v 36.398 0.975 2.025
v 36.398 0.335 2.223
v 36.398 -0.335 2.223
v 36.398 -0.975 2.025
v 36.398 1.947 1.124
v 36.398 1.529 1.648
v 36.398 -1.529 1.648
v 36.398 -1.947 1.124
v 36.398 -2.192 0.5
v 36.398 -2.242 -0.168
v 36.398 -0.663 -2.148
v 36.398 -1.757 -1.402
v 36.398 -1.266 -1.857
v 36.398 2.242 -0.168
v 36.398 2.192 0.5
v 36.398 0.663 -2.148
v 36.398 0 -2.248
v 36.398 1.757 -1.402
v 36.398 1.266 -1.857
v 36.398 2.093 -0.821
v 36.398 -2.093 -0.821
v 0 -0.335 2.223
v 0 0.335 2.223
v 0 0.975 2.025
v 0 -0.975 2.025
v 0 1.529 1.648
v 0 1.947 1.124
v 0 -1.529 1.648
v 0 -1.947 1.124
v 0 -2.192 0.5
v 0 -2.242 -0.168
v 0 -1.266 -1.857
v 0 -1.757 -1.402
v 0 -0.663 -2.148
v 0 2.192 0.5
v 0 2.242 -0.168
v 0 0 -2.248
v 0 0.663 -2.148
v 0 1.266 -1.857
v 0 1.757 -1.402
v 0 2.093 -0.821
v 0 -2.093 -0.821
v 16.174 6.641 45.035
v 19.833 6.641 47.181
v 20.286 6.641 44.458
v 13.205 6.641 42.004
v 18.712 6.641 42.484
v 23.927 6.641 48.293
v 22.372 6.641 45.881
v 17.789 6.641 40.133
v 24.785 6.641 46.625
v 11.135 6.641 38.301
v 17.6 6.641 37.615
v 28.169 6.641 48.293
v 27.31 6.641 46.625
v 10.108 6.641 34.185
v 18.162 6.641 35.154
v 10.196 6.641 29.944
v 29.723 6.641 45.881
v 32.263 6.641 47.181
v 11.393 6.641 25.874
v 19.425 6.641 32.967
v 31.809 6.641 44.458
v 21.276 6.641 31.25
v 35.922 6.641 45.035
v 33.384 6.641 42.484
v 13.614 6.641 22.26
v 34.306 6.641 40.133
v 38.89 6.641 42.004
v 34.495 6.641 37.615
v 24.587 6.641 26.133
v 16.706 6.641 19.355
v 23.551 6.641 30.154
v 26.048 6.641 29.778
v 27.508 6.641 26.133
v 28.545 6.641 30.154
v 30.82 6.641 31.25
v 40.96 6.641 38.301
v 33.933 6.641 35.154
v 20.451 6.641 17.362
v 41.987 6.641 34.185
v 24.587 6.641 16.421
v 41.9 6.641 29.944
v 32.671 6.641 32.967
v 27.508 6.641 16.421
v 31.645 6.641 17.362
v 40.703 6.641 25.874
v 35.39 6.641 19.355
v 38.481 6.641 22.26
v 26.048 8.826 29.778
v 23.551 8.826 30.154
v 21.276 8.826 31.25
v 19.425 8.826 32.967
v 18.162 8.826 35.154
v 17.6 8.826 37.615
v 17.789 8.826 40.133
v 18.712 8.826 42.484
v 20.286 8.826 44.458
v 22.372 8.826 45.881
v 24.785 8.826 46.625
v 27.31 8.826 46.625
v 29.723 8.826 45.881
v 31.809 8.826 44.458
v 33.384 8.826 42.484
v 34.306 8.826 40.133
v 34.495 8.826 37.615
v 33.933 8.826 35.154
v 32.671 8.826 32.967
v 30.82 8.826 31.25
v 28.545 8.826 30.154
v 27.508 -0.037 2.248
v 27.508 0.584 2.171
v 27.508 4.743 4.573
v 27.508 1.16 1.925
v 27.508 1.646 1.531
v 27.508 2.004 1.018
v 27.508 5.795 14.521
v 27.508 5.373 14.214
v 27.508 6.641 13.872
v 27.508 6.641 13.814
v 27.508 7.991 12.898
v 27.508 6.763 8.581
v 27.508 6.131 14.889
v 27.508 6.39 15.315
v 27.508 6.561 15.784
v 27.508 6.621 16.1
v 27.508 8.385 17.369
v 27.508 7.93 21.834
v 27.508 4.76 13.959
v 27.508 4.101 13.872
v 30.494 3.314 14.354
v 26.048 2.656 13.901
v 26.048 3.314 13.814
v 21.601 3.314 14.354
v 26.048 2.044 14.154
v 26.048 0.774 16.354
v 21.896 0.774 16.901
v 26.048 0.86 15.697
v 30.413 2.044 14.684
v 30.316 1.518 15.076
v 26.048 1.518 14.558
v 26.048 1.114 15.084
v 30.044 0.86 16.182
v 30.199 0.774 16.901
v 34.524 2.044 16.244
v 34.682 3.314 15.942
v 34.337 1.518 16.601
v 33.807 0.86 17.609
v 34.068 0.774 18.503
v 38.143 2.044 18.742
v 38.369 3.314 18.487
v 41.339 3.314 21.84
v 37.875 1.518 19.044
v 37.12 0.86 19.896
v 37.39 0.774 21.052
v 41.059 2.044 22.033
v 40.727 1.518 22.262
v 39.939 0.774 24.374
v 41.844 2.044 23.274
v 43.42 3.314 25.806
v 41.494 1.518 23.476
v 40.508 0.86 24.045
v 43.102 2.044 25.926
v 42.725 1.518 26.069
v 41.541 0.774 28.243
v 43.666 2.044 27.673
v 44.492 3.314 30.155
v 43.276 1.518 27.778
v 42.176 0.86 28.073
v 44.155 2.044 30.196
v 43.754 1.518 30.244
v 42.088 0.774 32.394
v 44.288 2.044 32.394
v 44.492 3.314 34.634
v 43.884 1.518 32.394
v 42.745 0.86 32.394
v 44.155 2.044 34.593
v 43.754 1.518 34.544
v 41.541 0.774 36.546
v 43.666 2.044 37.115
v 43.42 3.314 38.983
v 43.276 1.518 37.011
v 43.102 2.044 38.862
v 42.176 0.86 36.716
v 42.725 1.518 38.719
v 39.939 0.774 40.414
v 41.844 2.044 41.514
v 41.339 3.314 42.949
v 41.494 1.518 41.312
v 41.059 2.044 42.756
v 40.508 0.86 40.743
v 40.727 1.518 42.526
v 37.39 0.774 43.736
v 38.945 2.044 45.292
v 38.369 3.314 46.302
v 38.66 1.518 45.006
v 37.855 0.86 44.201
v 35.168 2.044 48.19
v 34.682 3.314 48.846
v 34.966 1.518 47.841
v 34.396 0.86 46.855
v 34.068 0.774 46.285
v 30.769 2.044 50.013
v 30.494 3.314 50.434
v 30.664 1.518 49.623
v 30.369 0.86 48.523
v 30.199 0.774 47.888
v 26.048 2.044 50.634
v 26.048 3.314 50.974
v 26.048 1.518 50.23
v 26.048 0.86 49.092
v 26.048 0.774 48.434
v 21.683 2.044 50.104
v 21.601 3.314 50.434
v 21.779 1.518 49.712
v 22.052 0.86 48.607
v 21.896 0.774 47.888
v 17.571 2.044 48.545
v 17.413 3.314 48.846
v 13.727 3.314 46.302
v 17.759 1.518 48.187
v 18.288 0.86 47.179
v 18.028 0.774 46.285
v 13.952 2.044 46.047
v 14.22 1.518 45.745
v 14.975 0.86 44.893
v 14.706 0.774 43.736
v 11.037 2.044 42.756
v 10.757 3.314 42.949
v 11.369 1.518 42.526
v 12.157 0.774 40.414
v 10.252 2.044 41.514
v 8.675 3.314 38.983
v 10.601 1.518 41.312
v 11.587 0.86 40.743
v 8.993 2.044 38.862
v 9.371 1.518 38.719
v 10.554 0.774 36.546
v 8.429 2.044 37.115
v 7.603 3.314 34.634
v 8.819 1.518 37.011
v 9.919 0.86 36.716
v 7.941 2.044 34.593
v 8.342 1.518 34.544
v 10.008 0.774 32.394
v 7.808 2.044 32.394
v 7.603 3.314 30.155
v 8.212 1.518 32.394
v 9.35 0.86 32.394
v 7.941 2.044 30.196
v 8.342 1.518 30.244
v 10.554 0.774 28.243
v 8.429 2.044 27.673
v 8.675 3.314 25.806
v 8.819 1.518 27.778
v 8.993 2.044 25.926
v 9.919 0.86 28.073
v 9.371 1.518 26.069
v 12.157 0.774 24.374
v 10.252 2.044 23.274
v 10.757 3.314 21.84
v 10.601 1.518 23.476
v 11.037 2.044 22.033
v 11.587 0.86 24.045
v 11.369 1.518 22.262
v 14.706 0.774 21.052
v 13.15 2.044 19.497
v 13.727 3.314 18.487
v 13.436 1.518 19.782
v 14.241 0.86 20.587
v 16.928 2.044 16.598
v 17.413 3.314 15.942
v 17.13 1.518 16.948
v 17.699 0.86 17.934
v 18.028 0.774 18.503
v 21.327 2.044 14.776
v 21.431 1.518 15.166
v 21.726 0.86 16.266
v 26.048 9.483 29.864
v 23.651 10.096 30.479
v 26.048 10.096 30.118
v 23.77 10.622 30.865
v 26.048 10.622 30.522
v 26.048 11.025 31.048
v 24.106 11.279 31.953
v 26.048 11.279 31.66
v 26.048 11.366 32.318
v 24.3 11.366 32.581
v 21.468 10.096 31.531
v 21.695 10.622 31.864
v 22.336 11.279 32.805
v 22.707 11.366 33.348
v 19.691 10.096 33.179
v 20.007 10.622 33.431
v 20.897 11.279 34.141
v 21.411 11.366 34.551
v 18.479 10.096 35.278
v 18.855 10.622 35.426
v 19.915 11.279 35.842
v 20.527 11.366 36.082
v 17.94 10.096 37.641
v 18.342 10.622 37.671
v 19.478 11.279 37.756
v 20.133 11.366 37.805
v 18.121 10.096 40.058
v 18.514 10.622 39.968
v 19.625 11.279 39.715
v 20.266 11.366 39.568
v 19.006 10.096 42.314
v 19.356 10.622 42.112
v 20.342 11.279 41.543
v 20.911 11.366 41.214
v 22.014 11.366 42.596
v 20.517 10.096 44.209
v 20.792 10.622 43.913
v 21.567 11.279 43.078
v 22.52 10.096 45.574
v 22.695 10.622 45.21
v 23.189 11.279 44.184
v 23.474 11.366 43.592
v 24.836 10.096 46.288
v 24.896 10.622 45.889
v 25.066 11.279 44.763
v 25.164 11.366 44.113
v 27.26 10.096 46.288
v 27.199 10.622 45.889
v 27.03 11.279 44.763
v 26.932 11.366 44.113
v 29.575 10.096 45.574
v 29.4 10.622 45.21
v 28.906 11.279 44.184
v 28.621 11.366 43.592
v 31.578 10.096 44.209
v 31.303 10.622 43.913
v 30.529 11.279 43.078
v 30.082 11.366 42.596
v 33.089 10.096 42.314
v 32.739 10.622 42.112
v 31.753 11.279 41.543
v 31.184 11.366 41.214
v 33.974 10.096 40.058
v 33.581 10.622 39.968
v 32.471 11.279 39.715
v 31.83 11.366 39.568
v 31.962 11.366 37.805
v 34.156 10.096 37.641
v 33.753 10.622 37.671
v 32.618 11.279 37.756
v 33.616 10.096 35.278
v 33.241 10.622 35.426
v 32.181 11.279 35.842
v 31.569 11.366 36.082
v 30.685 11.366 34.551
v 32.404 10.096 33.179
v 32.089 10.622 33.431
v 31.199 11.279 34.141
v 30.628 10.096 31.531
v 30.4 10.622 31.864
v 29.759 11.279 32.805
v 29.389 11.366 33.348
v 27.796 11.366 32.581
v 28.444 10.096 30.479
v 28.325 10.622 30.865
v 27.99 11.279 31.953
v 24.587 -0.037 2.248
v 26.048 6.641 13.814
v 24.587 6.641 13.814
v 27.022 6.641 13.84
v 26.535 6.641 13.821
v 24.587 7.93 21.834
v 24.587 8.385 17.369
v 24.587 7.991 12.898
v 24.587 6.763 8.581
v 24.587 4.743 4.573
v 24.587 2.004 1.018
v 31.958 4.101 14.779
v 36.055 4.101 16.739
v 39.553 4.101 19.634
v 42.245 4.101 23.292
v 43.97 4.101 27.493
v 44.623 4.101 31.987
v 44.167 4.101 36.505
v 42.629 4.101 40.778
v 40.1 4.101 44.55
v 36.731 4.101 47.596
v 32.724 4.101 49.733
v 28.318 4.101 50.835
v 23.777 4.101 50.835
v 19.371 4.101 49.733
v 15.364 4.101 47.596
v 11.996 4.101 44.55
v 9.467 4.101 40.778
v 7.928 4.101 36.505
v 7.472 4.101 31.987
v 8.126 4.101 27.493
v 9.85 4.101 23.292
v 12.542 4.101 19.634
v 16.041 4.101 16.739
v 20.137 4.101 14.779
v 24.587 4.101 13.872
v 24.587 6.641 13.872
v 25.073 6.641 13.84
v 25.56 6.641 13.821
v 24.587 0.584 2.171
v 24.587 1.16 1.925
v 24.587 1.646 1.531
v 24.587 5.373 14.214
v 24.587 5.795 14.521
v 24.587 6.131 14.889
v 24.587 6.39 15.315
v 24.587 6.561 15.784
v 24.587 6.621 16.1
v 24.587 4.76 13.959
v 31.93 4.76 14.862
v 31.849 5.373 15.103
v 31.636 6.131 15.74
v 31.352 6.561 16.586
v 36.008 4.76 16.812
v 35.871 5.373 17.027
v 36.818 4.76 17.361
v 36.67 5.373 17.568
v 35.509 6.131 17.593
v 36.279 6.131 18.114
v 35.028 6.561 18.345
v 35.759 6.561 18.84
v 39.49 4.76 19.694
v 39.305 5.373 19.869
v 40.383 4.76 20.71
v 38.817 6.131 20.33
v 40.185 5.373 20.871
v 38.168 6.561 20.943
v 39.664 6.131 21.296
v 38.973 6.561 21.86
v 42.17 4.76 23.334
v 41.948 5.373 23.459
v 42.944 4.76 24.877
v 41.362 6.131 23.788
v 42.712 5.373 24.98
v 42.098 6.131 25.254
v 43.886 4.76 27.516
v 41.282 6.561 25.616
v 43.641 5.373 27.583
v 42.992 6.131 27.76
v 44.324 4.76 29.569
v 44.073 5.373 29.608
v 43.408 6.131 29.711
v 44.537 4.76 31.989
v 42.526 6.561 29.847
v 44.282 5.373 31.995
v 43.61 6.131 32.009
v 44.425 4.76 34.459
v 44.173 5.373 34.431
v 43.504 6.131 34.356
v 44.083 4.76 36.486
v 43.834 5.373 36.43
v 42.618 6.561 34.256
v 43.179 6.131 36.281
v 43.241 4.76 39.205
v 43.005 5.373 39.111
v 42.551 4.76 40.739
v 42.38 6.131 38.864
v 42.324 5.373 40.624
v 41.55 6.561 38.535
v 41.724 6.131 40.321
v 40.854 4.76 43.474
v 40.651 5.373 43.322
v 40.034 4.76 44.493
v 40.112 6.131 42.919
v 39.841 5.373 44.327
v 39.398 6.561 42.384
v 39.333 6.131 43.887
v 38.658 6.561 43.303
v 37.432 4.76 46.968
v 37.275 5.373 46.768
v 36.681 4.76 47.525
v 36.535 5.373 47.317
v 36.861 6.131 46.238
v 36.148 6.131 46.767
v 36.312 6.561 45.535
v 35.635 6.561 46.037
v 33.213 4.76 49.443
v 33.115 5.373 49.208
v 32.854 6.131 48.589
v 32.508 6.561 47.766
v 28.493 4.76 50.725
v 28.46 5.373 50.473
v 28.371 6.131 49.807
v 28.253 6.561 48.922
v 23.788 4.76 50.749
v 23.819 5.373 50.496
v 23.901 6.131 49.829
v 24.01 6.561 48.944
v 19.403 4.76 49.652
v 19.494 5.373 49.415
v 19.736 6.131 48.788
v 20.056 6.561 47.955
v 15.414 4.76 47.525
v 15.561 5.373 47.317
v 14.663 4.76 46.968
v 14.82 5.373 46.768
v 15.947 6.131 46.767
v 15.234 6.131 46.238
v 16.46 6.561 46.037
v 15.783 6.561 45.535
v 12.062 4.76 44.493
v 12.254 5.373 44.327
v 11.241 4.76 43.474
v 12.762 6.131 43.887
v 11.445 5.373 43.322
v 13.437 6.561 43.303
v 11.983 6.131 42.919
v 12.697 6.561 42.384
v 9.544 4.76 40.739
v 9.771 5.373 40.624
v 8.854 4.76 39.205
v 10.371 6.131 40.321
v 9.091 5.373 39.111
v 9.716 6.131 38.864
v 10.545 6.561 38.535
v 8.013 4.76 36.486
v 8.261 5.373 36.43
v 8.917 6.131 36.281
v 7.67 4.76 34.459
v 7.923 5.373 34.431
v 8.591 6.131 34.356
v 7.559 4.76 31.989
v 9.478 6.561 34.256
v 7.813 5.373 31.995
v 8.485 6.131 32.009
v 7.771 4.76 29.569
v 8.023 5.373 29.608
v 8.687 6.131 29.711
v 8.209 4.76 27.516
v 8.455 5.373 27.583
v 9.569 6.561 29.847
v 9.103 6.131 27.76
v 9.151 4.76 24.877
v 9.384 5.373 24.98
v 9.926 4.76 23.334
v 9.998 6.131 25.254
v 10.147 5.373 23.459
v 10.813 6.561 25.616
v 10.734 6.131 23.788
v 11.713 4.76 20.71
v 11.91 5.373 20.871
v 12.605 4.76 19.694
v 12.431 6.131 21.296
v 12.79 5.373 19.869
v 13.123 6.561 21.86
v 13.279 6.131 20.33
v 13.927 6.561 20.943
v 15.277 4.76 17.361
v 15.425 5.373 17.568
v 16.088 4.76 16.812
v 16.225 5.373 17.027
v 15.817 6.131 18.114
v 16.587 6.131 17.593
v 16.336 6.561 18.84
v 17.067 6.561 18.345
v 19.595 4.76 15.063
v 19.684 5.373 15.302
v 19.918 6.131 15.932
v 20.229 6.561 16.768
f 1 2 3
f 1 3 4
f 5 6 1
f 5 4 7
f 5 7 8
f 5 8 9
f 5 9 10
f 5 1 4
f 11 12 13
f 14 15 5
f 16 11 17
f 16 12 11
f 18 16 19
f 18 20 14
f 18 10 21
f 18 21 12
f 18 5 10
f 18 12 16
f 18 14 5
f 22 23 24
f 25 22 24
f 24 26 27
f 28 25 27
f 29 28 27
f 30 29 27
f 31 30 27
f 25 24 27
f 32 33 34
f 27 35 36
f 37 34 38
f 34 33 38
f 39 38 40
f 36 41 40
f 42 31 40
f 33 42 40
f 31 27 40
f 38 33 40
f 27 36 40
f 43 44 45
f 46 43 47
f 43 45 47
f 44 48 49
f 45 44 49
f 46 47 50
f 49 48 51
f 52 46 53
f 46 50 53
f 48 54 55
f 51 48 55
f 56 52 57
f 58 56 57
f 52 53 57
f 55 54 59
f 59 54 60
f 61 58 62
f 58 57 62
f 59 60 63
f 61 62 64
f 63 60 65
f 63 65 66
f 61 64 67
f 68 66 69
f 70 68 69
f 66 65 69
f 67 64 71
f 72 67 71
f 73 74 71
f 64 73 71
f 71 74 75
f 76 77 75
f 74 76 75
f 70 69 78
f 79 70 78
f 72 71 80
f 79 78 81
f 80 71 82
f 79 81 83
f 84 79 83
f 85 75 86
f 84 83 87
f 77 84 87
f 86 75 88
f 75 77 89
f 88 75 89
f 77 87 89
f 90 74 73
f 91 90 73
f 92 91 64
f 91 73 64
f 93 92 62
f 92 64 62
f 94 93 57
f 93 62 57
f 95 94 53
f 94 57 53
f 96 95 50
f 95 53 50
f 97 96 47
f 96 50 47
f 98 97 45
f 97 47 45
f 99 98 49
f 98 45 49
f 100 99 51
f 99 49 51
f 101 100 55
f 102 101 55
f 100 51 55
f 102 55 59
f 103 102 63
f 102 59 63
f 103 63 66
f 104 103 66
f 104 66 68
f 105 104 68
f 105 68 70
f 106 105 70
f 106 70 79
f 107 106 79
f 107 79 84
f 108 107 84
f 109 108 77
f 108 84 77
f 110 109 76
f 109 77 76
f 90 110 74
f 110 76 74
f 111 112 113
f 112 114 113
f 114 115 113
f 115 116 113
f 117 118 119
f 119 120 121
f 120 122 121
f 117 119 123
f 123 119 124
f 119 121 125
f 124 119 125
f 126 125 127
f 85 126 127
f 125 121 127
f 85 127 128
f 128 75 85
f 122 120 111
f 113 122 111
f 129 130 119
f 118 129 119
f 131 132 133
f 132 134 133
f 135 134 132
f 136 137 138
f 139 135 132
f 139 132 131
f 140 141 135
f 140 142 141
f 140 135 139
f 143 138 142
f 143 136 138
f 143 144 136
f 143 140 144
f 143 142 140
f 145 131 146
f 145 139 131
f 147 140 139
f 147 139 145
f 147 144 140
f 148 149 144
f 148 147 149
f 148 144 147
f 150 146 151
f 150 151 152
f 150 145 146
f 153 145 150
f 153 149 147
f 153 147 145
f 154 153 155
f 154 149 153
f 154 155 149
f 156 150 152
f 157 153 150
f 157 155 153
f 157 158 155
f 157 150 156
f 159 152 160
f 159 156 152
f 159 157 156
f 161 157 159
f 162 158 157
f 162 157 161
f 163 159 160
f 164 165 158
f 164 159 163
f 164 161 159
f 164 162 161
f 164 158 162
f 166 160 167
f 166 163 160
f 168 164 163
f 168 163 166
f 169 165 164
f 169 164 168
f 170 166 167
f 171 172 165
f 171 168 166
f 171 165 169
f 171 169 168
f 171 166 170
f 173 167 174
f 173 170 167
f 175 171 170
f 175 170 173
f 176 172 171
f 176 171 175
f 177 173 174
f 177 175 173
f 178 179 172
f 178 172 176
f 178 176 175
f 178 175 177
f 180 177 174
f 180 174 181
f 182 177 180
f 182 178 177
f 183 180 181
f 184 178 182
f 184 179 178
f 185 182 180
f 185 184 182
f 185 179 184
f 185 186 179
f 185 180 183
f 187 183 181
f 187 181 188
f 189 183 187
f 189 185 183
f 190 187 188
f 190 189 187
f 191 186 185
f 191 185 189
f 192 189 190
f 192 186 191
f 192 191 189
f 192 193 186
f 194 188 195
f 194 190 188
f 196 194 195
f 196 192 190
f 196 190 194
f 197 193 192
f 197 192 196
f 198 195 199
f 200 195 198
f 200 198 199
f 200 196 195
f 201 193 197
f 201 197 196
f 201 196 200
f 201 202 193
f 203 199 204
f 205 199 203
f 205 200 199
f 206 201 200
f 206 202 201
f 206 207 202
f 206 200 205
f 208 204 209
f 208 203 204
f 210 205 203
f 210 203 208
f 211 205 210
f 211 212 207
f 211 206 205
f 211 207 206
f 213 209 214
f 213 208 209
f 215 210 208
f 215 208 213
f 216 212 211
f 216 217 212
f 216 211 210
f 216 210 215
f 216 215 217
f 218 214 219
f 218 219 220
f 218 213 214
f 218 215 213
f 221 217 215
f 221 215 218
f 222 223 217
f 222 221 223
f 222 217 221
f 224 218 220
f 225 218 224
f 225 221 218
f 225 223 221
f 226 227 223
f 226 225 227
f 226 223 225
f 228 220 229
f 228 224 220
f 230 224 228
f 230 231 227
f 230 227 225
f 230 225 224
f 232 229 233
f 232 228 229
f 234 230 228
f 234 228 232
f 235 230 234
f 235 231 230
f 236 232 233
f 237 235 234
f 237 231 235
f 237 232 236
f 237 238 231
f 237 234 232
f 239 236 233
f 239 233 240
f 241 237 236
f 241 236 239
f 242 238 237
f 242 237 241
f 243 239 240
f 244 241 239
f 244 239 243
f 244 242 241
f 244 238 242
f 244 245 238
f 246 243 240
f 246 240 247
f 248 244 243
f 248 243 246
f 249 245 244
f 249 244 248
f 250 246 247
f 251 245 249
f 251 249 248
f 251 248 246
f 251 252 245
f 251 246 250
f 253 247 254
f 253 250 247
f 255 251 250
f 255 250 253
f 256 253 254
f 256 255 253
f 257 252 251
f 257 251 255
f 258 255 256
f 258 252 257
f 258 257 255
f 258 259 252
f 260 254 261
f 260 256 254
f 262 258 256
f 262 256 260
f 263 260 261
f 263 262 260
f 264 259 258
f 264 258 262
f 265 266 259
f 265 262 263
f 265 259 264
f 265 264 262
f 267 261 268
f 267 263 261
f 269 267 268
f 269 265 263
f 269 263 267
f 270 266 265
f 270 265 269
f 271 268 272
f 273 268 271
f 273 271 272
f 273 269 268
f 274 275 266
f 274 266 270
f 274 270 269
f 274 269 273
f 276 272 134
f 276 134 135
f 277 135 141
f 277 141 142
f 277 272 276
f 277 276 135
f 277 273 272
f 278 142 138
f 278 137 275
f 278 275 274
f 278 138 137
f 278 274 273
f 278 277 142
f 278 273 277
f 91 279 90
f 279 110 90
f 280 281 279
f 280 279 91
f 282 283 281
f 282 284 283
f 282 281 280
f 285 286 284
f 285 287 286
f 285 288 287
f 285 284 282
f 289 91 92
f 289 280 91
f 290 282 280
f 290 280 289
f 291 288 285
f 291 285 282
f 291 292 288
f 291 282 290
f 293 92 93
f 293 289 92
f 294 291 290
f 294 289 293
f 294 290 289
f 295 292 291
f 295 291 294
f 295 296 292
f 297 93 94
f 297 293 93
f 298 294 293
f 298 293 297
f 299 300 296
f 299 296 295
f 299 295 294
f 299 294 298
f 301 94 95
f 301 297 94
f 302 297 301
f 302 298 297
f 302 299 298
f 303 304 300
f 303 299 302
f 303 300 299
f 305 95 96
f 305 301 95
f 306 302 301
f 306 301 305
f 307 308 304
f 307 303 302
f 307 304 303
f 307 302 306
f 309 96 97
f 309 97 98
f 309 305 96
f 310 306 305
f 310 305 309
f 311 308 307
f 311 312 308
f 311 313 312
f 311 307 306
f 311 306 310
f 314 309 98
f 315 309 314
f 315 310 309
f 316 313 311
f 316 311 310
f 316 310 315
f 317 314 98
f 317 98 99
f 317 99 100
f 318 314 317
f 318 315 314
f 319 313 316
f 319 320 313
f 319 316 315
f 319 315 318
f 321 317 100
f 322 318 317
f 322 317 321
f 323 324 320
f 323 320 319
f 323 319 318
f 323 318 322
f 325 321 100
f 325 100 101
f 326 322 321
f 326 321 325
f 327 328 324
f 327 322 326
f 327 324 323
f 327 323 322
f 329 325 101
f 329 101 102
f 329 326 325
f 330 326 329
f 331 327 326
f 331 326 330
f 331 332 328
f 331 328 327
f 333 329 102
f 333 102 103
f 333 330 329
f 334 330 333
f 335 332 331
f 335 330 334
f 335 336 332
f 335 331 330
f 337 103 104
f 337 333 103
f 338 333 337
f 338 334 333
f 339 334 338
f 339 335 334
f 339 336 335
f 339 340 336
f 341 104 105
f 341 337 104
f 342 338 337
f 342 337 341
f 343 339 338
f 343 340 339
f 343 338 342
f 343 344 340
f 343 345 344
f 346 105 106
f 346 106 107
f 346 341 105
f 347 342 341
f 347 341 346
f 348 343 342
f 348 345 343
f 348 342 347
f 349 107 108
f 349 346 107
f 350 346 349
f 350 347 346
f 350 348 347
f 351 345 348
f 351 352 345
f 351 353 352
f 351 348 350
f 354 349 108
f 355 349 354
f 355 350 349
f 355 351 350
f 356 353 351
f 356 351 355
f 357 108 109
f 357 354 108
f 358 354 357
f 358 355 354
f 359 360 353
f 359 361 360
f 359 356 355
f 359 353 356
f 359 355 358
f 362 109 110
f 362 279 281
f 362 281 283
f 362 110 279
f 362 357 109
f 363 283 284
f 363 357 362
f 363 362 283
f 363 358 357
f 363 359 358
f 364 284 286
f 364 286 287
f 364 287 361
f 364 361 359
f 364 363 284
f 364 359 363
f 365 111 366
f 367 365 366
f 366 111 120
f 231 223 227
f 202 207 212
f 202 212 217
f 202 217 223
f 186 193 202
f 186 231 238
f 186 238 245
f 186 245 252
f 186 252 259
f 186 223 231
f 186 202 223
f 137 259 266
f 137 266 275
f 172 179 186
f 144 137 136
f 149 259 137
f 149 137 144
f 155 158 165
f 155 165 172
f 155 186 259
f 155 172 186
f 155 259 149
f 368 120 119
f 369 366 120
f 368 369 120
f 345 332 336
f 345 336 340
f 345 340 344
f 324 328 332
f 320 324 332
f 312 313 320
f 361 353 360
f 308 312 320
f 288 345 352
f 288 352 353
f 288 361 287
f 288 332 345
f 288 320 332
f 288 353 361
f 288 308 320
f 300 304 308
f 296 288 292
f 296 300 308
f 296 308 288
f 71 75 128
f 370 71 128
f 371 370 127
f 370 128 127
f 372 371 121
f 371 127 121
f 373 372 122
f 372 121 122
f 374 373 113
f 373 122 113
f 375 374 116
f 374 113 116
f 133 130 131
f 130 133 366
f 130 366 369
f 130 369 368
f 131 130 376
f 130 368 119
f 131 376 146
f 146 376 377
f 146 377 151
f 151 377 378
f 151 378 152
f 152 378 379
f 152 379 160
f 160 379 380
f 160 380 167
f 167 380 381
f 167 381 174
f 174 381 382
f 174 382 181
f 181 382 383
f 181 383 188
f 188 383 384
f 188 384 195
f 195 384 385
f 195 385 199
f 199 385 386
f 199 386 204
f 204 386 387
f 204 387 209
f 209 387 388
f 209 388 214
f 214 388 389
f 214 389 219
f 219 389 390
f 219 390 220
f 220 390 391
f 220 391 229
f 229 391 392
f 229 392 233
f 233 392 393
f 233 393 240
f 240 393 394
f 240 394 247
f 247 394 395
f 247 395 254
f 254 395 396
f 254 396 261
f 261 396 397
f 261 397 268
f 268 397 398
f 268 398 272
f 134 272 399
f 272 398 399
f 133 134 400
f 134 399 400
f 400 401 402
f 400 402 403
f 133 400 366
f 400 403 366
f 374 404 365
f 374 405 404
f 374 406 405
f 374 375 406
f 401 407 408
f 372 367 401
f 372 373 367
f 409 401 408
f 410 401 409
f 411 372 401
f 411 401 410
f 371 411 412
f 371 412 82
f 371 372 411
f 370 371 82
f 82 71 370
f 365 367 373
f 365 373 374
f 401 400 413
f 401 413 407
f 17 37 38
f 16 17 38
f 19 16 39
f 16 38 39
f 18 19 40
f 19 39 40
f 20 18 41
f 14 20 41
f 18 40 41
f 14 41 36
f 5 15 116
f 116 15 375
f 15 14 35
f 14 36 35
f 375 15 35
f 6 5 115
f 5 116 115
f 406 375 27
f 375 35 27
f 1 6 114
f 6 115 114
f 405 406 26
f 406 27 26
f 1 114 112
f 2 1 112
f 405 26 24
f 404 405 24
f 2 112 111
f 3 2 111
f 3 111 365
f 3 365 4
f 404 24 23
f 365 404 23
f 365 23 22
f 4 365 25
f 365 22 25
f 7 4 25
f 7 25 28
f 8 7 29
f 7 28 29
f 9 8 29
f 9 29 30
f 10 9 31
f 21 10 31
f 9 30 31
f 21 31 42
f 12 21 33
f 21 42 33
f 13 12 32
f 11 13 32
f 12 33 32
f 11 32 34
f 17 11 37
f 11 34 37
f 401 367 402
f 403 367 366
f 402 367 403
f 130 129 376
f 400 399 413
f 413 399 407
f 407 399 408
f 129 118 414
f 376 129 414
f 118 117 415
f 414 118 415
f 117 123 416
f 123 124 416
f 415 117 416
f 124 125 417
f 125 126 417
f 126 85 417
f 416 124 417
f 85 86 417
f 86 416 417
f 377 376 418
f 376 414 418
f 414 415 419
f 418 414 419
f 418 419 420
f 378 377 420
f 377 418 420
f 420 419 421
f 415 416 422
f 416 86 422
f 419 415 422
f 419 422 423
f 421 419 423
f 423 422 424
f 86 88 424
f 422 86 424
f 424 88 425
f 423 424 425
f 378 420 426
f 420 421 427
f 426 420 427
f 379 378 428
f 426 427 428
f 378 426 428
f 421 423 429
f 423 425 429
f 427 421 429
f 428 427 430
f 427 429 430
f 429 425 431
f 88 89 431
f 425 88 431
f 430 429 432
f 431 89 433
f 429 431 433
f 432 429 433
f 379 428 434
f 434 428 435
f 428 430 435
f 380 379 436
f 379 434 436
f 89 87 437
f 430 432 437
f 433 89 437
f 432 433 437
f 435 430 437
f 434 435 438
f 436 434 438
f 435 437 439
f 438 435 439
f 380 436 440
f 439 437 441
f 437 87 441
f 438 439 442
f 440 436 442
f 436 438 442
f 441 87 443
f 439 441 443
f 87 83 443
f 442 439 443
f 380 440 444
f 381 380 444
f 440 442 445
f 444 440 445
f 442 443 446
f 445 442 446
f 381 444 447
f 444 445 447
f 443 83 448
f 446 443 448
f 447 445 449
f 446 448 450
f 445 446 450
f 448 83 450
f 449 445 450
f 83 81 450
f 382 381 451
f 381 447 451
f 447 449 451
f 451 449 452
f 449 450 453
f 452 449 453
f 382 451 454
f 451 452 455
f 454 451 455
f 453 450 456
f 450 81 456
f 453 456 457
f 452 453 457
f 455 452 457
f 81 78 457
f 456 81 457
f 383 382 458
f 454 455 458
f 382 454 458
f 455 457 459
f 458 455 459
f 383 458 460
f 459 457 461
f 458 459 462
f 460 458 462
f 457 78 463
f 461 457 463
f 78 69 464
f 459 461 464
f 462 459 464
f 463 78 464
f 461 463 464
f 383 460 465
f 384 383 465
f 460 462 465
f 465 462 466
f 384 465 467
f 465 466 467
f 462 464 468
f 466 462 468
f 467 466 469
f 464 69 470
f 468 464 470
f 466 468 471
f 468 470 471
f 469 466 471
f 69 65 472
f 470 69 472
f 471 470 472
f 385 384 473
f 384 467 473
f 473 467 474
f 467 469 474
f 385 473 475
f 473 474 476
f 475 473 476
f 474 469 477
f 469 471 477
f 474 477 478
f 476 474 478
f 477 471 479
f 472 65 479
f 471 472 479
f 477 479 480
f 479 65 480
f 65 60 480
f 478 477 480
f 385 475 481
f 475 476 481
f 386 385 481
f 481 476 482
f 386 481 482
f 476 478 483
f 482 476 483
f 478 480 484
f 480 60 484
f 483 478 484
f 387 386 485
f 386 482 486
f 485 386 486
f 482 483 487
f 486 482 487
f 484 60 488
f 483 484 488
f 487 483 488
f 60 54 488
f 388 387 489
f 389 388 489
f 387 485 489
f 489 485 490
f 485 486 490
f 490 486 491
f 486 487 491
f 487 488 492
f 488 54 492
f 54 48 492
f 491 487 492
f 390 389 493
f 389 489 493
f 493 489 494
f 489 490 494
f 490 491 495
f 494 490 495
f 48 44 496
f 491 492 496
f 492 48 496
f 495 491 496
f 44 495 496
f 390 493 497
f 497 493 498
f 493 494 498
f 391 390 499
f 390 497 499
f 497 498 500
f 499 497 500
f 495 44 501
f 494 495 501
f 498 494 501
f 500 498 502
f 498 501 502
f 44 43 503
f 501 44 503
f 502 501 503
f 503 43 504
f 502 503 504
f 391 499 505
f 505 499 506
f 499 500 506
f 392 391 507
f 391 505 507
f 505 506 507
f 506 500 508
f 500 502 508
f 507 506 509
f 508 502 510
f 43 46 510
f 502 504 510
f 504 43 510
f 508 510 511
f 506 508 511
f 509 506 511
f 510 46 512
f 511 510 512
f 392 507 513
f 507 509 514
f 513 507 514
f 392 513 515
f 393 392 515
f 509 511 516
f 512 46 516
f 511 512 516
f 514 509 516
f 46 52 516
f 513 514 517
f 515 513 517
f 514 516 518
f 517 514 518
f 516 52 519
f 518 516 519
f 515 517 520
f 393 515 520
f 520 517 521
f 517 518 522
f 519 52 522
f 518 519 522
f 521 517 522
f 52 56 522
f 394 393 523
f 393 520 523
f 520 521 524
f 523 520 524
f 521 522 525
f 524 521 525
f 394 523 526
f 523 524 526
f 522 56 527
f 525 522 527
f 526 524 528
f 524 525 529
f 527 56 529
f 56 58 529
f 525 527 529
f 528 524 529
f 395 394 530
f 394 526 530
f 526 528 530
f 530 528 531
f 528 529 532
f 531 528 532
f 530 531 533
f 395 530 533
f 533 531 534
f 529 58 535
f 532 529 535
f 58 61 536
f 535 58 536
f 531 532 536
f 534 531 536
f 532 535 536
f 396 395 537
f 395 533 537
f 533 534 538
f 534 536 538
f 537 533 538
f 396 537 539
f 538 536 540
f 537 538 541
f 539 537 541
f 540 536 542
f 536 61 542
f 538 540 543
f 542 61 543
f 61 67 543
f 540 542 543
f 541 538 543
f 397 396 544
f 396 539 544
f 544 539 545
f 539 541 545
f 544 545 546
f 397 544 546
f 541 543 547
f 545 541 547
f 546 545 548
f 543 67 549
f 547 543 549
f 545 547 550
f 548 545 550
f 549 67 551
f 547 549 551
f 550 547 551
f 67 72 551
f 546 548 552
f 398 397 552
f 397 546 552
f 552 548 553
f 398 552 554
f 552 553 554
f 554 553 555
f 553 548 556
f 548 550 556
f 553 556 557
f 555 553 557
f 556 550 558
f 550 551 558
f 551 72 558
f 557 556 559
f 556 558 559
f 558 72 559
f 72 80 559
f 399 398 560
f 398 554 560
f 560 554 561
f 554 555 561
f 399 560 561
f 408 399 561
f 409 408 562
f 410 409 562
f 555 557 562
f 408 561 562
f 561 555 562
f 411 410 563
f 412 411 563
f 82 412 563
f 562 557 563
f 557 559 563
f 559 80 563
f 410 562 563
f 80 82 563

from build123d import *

# Parameters (mm, degrees)
SKETCH1_R           = 2.2479
BOSS_EXTRUDE1_DEPTH = 36.3982
BOSS_EXTRUDE2_DEPTH = 2.921
SKETCH3_R           = 18.5801
BOSS_EXTRUDE3_DEPTH = 5.8674
FILLET1_R           = 2.54
SKETCH4_R           = 8.4709
BOSS_EXTRUDE4_DEPTH = 4.7244
FILLET2_R           = 2.54


with BuildPart() as part:
    # Sketch1 → Boss-Extrude1 (new body)
    with BuildSketch(Plane(origin=(0, 0, 0), x_dir=(0, 0, -1), z_dir=(1, 0, 0))):
        Circle(SKETCH1_R)
    extrude(amount=BOSS_EXTRUDE1_DEPTH)

    # Sketch2 → Boss-Extrude2 (add)
    with BuildSketch(Plane(origin=(27.5082, 0, 0), x_dir=(0, 0, -1), z_dir=(1, 0, 0))):
        with BuildLine():
            Line((0, -1.334463955), (-13.814144421, 6.641136045))
            Line((-13.814144421, 6.641136045), (-26.133144421, 6.641136045))
            ThreePointArc((-26.133144421, 6.641136045), (-12.195347715, 7.850704504), (0, 0.995142749))
            Line((0, 0.995142749), (0, -1.334463955))
        make_face()
    extrude(amount=-BOSS_EXTRUDE2_DEPTH)

    # Sketch3 → Boss-Extrude3 (add)
    with BuildSketch(Plane.XZ.offset(-6.641136045)):
        with Locations(Location((26.0477, 32.394244421, 0), (0, 0, 270))):
            Circle(SKETCH3_R)
    extrude(amount=BOSS_EXTRUDE3_DEPTH)

    # Fillet1
    fillet1_edges = [part.edges().sort_by_distance(p)[0] for p in [
        (26.0477, 6.641136045, 50.974344421),
        (26.0477, 0.773736045, 50.974344421),
    ]]
    fillet(fillet1_edges, radius=FILLET1_R)

    # Sketch4 → Boss-Extrude4 (add)
    with BuildSketch(Plane(origin=(0, 6.641136045, 0), x_dir=(1, 0, 0), z_dir=(0, 1, 0))):
        with Locations(Location((26.0477, -38.248526032, 0), (0, 0, 90))):
            Circle(SKETCH4_R)
    extrude(amount=BOSS_EXTRUDE4_DEPTH)

    # Fillet2
    fillet2_edges = [part.edges().sort_by_distance(p)[0] for p in [
        (26.0477, 11.365536045, 46.719426032),
    ]]
    fillet(fillet2_edges, radius=FILLET2_R)


solid = part.part
